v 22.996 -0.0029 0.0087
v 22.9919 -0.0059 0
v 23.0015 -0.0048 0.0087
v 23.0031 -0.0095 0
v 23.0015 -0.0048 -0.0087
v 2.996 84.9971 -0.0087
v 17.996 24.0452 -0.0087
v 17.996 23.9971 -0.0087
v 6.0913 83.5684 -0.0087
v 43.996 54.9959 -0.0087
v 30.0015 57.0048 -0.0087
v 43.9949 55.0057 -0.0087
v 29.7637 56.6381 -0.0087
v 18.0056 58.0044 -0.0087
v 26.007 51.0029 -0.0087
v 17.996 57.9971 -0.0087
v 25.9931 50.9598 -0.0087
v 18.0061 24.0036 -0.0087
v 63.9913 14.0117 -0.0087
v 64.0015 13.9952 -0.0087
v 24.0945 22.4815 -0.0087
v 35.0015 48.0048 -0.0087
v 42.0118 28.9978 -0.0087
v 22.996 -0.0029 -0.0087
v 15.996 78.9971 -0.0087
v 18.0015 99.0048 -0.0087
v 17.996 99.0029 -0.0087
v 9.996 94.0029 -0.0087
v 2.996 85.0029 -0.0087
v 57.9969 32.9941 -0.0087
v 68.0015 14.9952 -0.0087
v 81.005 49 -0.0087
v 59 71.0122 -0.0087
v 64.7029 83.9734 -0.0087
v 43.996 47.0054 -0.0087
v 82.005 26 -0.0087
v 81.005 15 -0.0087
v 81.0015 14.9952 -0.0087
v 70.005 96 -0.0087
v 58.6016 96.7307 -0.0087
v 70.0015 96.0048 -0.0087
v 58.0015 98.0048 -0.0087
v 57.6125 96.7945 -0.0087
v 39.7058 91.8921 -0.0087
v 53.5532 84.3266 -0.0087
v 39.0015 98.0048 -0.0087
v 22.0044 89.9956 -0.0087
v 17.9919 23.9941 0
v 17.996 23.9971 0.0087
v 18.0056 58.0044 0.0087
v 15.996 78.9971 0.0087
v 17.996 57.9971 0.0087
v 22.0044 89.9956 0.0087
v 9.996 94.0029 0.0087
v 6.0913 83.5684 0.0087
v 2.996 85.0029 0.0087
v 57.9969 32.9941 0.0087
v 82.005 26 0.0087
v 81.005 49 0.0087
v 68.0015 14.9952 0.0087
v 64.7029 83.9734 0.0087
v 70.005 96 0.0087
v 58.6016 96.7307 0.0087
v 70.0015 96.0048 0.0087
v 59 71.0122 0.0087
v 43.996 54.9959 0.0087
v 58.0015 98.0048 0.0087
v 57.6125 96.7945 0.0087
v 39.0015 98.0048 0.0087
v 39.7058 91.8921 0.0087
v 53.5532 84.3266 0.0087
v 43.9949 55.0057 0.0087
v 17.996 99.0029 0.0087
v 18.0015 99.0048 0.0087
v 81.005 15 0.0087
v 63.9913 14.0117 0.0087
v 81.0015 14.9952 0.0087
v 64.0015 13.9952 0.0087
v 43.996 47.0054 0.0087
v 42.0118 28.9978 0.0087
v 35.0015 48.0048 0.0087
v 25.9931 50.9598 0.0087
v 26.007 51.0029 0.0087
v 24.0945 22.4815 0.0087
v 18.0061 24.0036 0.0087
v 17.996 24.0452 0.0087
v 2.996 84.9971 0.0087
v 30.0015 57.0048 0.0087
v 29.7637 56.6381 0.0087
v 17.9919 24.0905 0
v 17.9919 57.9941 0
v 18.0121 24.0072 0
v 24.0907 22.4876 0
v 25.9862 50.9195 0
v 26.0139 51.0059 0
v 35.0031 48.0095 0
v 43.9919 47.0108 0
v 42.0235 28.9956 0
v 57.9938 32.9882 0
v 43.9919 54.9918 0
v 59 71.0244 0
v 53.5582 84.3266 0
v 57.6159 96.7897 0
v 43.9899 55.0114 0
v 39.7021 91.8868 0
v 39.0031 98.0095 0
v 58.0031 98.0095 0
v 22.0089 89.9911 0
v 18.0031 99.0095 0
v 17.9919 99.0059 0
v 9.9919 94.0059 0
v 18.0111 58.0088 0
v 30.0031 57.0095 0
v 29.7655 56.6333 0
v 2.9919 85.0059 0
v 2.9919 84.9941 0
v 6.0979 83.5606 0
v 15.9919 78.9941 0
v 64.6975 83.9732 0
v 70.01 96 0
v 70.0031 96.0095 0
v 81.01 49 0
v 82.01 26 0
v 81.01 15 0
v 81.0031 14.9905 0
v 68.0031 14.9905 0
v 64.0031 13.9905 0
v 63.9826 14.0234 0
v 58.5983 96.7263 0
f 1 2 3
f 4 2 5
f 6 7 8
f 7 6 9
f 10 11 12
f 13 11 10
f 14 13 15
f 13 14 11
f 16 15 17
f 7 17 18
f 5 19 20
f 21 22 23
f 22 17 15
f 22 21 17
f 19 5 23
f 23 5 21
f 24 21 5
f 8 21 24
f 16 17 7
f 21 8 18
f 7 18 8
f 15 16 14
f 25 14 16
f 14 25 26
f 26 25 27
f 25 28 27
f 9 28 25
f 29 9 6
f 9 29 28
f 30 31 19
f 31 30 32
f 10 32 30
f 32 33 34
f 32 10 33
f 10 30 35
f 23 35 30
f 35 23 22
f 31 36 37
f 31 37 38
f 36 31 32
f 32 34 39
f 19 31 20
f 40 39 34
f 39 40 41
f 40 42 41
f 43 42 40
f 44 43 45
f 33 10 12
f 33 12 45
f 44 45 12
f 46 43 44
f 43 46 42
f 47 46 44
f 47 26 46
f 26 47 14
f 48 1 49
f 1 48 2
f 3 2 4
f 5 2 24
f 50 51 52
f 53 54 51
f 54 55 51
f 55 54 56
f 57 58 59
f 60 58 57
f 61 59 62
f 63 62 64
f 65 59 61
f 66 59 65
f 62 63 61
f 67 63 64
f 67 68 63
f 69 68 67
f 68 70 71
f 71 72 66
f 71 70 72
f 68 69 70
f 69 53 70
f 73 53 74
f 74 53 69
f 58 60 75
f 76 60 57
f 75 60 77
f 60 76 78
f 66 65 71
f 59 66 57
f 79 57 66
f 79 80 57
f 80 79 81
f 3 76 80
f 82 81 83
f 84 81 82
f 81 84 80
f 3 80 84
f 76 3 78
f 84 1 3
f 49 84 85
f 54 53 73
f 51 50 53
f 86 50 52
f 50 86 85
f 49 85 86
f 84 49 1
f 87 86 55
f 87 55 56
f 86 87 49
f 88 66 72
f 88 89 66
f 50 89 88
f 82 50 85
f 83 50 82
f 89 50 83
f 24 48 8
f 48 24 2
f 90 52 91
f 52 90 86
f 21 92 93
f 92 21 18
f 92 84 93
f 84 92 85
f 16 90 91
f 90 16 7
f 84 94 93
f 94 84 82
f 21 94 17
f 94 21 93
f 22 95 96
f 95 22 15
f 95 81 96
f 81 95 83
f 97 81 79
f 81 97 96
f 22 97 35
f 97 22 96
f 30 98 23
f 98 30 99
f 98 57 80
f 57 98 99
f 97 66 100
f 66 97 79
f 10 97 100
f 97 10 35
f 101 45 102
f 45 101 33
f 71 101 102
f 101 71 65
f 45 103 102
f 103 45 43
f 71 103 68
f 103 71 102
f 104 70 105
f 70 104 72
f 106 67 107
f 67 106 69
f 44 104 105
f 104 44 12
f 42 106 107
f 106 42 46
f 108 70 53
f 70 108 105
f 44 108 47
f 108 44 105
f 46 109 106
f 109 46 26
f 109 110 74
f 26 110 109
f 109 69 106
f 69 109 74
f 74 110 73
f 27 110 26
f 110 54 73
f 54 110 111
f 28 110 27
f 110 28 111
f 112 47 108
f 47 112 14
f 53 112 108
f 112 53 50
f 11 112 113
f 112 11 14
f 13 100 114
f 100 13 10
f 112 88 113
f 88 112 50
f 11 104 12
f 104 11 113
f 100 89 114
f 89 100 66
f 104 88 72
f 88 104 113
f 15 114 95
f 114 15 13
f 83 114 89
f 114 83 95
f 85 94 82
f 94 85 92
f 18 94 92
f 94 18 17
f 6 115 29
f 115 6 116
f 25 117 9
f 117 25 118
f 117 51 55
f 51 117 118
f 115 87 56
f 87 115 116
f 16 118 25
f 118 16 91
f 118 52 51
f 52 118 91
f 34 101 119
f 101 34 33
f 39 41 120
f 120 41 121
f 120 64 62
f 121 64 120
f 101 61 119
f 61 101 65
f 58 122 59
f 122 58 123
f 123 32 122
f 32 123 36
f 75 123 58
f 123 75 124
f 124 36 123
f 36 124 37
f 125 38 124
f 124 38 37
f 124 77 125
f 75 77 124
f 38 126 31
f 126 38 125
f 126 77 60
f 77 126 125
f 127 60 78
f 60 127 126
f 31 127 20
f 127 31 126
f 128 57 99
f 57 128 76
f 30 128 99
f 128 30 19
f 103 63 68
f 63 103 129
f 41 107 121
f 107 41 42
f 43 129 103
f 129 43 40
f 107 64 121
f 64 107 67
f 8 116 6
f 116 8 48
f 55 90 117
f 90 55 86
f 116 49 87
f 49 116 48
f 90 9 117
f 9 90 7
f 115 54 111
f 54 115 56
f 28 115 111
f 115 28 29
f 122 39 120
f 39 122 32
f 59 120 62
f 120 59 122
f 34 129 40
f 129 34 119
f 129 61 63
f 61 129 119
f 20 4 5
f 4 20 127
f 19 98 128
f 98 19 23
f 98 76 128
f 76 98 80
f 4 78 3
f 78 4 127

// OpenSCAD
color([0.3519350680925015,0.6477014615427978,0.14125726454845833]) hull(){
    translate([23,0]) sphere(0.01);
    translate([18,24]) sphere(0.01);
    translate([24,21]) sphere(0.01);
}
color([0.23013900541024712,0.8285218163248013,0.9603761550286747]) hull(){
    translate([18,24]) sphere(0.01);
    translate([26,22]) sphere(0.01);
    translate([24,21]) sphere(0.01);
}
color([0.6050710034948523,0.017553655236826726,0.43262871278032167]) hull(){
    translate([23,0]) sphere(0.01);
    translate([24,21]) sphere(0.01);
    translate([42,29]) sphere(0.01);
}
color([0.2571490251669072,0.4480229944680496,0.14517873337393172]) hull(){
    translate([42,29]) sphere(0.01);
    translate([24,21]) sphere(0.01);
    translate([26,51]) sphere(0.01);
}
color([0.8405131005933094,0.9776834869331054,0.10300019528175153]) hull(){
    translate([42,29]) sphere(0.01);
    translate([26,51]) sphere(0.01);
    translate([35,48]) sphere(0.01);
}
color([0.998153073210626,0.8535026464000083,0.6855970549077809]) hull(){
    translate([42,29]) sphere(0.01);
    translate([35,48]) sphere(0.01);
    translate([44,47]) sphere(0.01);
}
color([0.7995005100691247,0.34047238184459006,0.1286635278612125]) hull(){
    translate([42,29]) sphere(0.01);
    translate([44,47]) sphere(0.01);
    translate([58,33]) sphere(0.01);
}
color([0.6020598448119898,0.9167847797194366,0.02081986636819022]) hull(){
    translate([44,47]) sphere(0.01);
    translate([44,55]) sphere(0.01);
    translate([58,33]) sphere(0.01);
}
color([0.9135118305629362,0.3823609034395232,0.42581309278619206]) hull(){
    translate([44,55]) sphere(0.01);
    translate([59,71]) sphere(0.01);
    translate([58,33]) sphere(0.01);
}
color([0.08967296065919184,0.0016857337534631478,0.31287848776698257]) hull(){
    translate([44,55]) sphere(0.01);
    translate([59,71]) sphere(0.01);
    translate([50,93]) sphere(0.01);
}
color([0.09731792302828757,0.364404074066101,0.8754307508322564]) hull(){
    translate([44,55]) sphere(0.01);
    translate([58,98]) sphere(0.01);
    translate([50,93]) sphere(0.01);
}
color([0.6967090939923642,0.5776053806129825,0.18685318159950626]) hull(){
    translate([44,55]) sphere(0.01);
    translate([58,98]) sphere(0.01);
    translate([39,98]) sphere(0.01);
}
color([0.9585806736472646,0.593334846568766,0.09927504601217696]) hull(){
    translate([44,55]) sphere(0.01);
    translate([39,98]) sphere(0.01);
    translate([50,93]) sphere(0.01);
}
color([0.19313665173925,0.6863688301261038,0.2093263356404984]) hull(){
    translate([39,98]) sphere(0.01);
    translate([22,90]) sphere(0.01);
    translate([50,93]) sphere(0.01);
}
color([0.2694340379225941,0.24598969558588324,0.16092298384524362]) hull(){
    translate([39,98]) sphere(0.01);
    translate([22,90]) sphere(0.01);
    translate([18,99]) sphere(0.01);
}
color([0.5102606956149307,0.431705445139412,0.38909399282504675]) hull(){
    translate([22,90]) sphere(0.01);
    translate([10,94]) sphere(0.01);
    translate([18,99]) sphere(0.01);
}
color([0.3194819673674283,0.6655357355223767,0.22692357675811492]) hull(){
    translate([22,90]) sphere(0.01);
    translate([10,94]) sphere(0.01);
    translate([20,83]) sphere(0.01);
}
color([0.9464906820257937,0.35776616524050997,0.9421064453260054]) hull(){
    translate([22,90]) sphere(0.01);
    translate([18,58]) sphere(0.01);
    translate([20,83]) sphere(0.01);
}
color([0.3792404853118415,0.27508202782836655,0.9368074710650367]) hull(){
    translate([18,58]) sphere(0.01);
    translate([30,57]) sphere(0.01);
    translate([44,55]) sphere(0.01);
}
color([0.7670397757471089,0.17483880300164423,0.7474114244696689]) hull(){
    translate([18,58]) sphere(0.01);
    translate([26,51]) sphere(0.01);
    translate([30,57]) sphere(0.01);
}
color([0.6015236368594579,0.5872808850844162,0.28390336255679416]) hull(){
    translate([18,58]) sphere(0.01);
    translate([18,24]) sphere(0.01);
    translate([26,51]) sphere(0.01);
}
color([0.5839405385485582,0.4048698908705002,0.6877557316706271]) hull(){
    translate([16,79]) sphere(0.01);
    translate([6,84]) sphere(0.01);
    translate([3,85]) sphere(0.01);
}
color([0.29310936231965135,0.08456113000314536,0.6409271470126323]) hull(){
    translate([16,79]) sphere(0.01);
    translate([6,84]) sphere(0.01);
    translate([20,83]) sphere(0.01);
}
color([0.38512246522478266,0.6162859510128613,0.407224705538046]) hull(){
    translate([16,79]) sphere(0.01);
    translate([20,83]) sphere(0.01);
    translate([18,58]) sphere(0.01);
}
color([0.6107800780239486,0.9541913078580654,0.09369719926319908]) hull(){
    translate([20,83]) sphere(0.01);
    translate([10,94]) sphere(0.01);
    translate([6,84]) sphere(0.01);
}
color([0.4396226851829427,0.9817497074141792,0.30111933510979894]) hull(){
    translate([59,71]) sphere(0.01);
    translate([80,52]) sphere(0.01);
    translate([70,96]) sphere(0.01);
}
color([0.08571041628526821,0.691130580335744,0.16573157374072334]) hull(){
    translate([59,71]) sphere(0.01);
    translate([80,52]) sphere(0.01);
    translate([77,50]) sphere(0.01);
}
color([0.4668304924867862,0.30100213617539295,0.3511677492745029]) hull(){
    translate([59,71]) sphere(0.01);
    translate([77,50]) sphere(0.01);
    translate([81,49]) sphere(0.01);
}
color([0.05564944269037686,0.7696481469448815,0.686275624239137]) hull(){
    translate([59,71]) sphere(0.01);
    translate([81,49]) sphere(0.01);
    translate([82,26]) sphere(0.01);
}
color([0.15447252119296884,0.35335085758162643,0.18799175914388588]) hull(){
    translate([59,71]) sphere(0.01);
    translate([82,26]) sphere(0.01);
    translate([58,33]) sphere(0.01);
}
color([0.41322879780265653,0.82270842281296,0.9057146612667819]) hull(){
    translate([82,26]) sphere(0.01);
    translate([81,15]) sphere(0.01);
    translate([81,49]) sphere(0.01);
}
color([0.9688547633127277,0.5528378273263655,0.12760284187612392]) hull(){
    translate([81,15]) sphere(0.01);
    translate([72,20]) sphere(0.01);
    translate([81,49]) sphere(0.01);
}
color([0.1710979555253146,0.7131998843266452,0.6397779425125977]) hull(){
    translate([72,20]) sphere(0.01);
    translate([68,15]) sphere(0.01);
    translate([81,15]) sphere(0.01);
}
color([0.57496968906483,0.8489371230716904,0.07944838941339594]) hull(){
    translate([72,20]) sphere(0.01);
    translate([68,15]) sphere(0.01);
    translate([64,14]) sphere(0.01);
}
color([0.040333123224873146,0.9305910632054132,0.3080440975445232]) hull(){
    translate([72,20]) sphere(0.01);
    translate([64,14]) sphere(0.01);
    translate([82,26]) sphere(0.01);
}
color([0.6084655882345898,0.4923441190446234,0.7069385087242315]) hull(){
    translate([64,14]) sphere(0.01);
    translate([58,33]) sphere(0.01);
    translate([82,26]) sphere(0.01);
}
color([0.6803385961846494,0.18024793645131376,0.10787678186317007]) hull(){
    translate([80,52]) sphere(0.01);
    translate([77,50]) sphere(0.01);
    translate([81,49]) sphere(0.01);
}
color([0.1335624130282893,0.47731112778056706,0.8393950916733898]) hull(){
    translate([58,98]) sphere(0.01);
    translate([39,98]) sphere(0.01);
    translate([70,96]) sphere(0.01);
}
color([0.6780893207968227,0.08337096158279222,0.27725115680544954]) hull(){
    translate([10,94]) sphere(0.01);
    translate([18,99]) sphere(0.01);
    translate([39,98]) sphere(0.01);
}
color([0.9965791662073833,0.03375154870506614,0.10494976972159242]) hull(){
    translate([18,24]) sphere(0.01);
    translate([18,58]) sphere(0.01);
    translate([26,51]) sphere(0.01);
}
color([0.516844917539197,0.1360610465034362,0.543805910213663]) hull(){
    translate([18,24]) sphere(0.01);
    translate([3,85]) sphere(0.01);
    translate([6,84]) sphere(0.01);
}
color([0.04901628196141694,0.4867102513994055,0.8813892002857401]) hull(){
    translate([10,94]) sphere(0.01);
    translate([6,84]) sphere(0.01);
    translate([3,85]) sphere(0.01);
}
color([0.3053751014353143,0.40772022041766365,0.31297204198076634]) hull(){
    translate([80,52]) sphere(0.01);
    translate([81,49]) sphere(0.01);
    translate([70,96]) sphere(0.01);
}
color([0.49907796034366436,0.6160709555012981,0.9916538905911245]) hull(){
    translate([58,98]) sphere(0.01);
    translate([70,96]) sphere(0.01);
    translate([80,52]) sphere(0.01);
}
color([0.3123575451593331,0.46364206475662195,0.8862899719975306]) hull(){
    translate([23,0]) sphere(0.01);
    translate([64,14]) sphere(0.01);
    translate([42,29]) sphere(0.01);
}
